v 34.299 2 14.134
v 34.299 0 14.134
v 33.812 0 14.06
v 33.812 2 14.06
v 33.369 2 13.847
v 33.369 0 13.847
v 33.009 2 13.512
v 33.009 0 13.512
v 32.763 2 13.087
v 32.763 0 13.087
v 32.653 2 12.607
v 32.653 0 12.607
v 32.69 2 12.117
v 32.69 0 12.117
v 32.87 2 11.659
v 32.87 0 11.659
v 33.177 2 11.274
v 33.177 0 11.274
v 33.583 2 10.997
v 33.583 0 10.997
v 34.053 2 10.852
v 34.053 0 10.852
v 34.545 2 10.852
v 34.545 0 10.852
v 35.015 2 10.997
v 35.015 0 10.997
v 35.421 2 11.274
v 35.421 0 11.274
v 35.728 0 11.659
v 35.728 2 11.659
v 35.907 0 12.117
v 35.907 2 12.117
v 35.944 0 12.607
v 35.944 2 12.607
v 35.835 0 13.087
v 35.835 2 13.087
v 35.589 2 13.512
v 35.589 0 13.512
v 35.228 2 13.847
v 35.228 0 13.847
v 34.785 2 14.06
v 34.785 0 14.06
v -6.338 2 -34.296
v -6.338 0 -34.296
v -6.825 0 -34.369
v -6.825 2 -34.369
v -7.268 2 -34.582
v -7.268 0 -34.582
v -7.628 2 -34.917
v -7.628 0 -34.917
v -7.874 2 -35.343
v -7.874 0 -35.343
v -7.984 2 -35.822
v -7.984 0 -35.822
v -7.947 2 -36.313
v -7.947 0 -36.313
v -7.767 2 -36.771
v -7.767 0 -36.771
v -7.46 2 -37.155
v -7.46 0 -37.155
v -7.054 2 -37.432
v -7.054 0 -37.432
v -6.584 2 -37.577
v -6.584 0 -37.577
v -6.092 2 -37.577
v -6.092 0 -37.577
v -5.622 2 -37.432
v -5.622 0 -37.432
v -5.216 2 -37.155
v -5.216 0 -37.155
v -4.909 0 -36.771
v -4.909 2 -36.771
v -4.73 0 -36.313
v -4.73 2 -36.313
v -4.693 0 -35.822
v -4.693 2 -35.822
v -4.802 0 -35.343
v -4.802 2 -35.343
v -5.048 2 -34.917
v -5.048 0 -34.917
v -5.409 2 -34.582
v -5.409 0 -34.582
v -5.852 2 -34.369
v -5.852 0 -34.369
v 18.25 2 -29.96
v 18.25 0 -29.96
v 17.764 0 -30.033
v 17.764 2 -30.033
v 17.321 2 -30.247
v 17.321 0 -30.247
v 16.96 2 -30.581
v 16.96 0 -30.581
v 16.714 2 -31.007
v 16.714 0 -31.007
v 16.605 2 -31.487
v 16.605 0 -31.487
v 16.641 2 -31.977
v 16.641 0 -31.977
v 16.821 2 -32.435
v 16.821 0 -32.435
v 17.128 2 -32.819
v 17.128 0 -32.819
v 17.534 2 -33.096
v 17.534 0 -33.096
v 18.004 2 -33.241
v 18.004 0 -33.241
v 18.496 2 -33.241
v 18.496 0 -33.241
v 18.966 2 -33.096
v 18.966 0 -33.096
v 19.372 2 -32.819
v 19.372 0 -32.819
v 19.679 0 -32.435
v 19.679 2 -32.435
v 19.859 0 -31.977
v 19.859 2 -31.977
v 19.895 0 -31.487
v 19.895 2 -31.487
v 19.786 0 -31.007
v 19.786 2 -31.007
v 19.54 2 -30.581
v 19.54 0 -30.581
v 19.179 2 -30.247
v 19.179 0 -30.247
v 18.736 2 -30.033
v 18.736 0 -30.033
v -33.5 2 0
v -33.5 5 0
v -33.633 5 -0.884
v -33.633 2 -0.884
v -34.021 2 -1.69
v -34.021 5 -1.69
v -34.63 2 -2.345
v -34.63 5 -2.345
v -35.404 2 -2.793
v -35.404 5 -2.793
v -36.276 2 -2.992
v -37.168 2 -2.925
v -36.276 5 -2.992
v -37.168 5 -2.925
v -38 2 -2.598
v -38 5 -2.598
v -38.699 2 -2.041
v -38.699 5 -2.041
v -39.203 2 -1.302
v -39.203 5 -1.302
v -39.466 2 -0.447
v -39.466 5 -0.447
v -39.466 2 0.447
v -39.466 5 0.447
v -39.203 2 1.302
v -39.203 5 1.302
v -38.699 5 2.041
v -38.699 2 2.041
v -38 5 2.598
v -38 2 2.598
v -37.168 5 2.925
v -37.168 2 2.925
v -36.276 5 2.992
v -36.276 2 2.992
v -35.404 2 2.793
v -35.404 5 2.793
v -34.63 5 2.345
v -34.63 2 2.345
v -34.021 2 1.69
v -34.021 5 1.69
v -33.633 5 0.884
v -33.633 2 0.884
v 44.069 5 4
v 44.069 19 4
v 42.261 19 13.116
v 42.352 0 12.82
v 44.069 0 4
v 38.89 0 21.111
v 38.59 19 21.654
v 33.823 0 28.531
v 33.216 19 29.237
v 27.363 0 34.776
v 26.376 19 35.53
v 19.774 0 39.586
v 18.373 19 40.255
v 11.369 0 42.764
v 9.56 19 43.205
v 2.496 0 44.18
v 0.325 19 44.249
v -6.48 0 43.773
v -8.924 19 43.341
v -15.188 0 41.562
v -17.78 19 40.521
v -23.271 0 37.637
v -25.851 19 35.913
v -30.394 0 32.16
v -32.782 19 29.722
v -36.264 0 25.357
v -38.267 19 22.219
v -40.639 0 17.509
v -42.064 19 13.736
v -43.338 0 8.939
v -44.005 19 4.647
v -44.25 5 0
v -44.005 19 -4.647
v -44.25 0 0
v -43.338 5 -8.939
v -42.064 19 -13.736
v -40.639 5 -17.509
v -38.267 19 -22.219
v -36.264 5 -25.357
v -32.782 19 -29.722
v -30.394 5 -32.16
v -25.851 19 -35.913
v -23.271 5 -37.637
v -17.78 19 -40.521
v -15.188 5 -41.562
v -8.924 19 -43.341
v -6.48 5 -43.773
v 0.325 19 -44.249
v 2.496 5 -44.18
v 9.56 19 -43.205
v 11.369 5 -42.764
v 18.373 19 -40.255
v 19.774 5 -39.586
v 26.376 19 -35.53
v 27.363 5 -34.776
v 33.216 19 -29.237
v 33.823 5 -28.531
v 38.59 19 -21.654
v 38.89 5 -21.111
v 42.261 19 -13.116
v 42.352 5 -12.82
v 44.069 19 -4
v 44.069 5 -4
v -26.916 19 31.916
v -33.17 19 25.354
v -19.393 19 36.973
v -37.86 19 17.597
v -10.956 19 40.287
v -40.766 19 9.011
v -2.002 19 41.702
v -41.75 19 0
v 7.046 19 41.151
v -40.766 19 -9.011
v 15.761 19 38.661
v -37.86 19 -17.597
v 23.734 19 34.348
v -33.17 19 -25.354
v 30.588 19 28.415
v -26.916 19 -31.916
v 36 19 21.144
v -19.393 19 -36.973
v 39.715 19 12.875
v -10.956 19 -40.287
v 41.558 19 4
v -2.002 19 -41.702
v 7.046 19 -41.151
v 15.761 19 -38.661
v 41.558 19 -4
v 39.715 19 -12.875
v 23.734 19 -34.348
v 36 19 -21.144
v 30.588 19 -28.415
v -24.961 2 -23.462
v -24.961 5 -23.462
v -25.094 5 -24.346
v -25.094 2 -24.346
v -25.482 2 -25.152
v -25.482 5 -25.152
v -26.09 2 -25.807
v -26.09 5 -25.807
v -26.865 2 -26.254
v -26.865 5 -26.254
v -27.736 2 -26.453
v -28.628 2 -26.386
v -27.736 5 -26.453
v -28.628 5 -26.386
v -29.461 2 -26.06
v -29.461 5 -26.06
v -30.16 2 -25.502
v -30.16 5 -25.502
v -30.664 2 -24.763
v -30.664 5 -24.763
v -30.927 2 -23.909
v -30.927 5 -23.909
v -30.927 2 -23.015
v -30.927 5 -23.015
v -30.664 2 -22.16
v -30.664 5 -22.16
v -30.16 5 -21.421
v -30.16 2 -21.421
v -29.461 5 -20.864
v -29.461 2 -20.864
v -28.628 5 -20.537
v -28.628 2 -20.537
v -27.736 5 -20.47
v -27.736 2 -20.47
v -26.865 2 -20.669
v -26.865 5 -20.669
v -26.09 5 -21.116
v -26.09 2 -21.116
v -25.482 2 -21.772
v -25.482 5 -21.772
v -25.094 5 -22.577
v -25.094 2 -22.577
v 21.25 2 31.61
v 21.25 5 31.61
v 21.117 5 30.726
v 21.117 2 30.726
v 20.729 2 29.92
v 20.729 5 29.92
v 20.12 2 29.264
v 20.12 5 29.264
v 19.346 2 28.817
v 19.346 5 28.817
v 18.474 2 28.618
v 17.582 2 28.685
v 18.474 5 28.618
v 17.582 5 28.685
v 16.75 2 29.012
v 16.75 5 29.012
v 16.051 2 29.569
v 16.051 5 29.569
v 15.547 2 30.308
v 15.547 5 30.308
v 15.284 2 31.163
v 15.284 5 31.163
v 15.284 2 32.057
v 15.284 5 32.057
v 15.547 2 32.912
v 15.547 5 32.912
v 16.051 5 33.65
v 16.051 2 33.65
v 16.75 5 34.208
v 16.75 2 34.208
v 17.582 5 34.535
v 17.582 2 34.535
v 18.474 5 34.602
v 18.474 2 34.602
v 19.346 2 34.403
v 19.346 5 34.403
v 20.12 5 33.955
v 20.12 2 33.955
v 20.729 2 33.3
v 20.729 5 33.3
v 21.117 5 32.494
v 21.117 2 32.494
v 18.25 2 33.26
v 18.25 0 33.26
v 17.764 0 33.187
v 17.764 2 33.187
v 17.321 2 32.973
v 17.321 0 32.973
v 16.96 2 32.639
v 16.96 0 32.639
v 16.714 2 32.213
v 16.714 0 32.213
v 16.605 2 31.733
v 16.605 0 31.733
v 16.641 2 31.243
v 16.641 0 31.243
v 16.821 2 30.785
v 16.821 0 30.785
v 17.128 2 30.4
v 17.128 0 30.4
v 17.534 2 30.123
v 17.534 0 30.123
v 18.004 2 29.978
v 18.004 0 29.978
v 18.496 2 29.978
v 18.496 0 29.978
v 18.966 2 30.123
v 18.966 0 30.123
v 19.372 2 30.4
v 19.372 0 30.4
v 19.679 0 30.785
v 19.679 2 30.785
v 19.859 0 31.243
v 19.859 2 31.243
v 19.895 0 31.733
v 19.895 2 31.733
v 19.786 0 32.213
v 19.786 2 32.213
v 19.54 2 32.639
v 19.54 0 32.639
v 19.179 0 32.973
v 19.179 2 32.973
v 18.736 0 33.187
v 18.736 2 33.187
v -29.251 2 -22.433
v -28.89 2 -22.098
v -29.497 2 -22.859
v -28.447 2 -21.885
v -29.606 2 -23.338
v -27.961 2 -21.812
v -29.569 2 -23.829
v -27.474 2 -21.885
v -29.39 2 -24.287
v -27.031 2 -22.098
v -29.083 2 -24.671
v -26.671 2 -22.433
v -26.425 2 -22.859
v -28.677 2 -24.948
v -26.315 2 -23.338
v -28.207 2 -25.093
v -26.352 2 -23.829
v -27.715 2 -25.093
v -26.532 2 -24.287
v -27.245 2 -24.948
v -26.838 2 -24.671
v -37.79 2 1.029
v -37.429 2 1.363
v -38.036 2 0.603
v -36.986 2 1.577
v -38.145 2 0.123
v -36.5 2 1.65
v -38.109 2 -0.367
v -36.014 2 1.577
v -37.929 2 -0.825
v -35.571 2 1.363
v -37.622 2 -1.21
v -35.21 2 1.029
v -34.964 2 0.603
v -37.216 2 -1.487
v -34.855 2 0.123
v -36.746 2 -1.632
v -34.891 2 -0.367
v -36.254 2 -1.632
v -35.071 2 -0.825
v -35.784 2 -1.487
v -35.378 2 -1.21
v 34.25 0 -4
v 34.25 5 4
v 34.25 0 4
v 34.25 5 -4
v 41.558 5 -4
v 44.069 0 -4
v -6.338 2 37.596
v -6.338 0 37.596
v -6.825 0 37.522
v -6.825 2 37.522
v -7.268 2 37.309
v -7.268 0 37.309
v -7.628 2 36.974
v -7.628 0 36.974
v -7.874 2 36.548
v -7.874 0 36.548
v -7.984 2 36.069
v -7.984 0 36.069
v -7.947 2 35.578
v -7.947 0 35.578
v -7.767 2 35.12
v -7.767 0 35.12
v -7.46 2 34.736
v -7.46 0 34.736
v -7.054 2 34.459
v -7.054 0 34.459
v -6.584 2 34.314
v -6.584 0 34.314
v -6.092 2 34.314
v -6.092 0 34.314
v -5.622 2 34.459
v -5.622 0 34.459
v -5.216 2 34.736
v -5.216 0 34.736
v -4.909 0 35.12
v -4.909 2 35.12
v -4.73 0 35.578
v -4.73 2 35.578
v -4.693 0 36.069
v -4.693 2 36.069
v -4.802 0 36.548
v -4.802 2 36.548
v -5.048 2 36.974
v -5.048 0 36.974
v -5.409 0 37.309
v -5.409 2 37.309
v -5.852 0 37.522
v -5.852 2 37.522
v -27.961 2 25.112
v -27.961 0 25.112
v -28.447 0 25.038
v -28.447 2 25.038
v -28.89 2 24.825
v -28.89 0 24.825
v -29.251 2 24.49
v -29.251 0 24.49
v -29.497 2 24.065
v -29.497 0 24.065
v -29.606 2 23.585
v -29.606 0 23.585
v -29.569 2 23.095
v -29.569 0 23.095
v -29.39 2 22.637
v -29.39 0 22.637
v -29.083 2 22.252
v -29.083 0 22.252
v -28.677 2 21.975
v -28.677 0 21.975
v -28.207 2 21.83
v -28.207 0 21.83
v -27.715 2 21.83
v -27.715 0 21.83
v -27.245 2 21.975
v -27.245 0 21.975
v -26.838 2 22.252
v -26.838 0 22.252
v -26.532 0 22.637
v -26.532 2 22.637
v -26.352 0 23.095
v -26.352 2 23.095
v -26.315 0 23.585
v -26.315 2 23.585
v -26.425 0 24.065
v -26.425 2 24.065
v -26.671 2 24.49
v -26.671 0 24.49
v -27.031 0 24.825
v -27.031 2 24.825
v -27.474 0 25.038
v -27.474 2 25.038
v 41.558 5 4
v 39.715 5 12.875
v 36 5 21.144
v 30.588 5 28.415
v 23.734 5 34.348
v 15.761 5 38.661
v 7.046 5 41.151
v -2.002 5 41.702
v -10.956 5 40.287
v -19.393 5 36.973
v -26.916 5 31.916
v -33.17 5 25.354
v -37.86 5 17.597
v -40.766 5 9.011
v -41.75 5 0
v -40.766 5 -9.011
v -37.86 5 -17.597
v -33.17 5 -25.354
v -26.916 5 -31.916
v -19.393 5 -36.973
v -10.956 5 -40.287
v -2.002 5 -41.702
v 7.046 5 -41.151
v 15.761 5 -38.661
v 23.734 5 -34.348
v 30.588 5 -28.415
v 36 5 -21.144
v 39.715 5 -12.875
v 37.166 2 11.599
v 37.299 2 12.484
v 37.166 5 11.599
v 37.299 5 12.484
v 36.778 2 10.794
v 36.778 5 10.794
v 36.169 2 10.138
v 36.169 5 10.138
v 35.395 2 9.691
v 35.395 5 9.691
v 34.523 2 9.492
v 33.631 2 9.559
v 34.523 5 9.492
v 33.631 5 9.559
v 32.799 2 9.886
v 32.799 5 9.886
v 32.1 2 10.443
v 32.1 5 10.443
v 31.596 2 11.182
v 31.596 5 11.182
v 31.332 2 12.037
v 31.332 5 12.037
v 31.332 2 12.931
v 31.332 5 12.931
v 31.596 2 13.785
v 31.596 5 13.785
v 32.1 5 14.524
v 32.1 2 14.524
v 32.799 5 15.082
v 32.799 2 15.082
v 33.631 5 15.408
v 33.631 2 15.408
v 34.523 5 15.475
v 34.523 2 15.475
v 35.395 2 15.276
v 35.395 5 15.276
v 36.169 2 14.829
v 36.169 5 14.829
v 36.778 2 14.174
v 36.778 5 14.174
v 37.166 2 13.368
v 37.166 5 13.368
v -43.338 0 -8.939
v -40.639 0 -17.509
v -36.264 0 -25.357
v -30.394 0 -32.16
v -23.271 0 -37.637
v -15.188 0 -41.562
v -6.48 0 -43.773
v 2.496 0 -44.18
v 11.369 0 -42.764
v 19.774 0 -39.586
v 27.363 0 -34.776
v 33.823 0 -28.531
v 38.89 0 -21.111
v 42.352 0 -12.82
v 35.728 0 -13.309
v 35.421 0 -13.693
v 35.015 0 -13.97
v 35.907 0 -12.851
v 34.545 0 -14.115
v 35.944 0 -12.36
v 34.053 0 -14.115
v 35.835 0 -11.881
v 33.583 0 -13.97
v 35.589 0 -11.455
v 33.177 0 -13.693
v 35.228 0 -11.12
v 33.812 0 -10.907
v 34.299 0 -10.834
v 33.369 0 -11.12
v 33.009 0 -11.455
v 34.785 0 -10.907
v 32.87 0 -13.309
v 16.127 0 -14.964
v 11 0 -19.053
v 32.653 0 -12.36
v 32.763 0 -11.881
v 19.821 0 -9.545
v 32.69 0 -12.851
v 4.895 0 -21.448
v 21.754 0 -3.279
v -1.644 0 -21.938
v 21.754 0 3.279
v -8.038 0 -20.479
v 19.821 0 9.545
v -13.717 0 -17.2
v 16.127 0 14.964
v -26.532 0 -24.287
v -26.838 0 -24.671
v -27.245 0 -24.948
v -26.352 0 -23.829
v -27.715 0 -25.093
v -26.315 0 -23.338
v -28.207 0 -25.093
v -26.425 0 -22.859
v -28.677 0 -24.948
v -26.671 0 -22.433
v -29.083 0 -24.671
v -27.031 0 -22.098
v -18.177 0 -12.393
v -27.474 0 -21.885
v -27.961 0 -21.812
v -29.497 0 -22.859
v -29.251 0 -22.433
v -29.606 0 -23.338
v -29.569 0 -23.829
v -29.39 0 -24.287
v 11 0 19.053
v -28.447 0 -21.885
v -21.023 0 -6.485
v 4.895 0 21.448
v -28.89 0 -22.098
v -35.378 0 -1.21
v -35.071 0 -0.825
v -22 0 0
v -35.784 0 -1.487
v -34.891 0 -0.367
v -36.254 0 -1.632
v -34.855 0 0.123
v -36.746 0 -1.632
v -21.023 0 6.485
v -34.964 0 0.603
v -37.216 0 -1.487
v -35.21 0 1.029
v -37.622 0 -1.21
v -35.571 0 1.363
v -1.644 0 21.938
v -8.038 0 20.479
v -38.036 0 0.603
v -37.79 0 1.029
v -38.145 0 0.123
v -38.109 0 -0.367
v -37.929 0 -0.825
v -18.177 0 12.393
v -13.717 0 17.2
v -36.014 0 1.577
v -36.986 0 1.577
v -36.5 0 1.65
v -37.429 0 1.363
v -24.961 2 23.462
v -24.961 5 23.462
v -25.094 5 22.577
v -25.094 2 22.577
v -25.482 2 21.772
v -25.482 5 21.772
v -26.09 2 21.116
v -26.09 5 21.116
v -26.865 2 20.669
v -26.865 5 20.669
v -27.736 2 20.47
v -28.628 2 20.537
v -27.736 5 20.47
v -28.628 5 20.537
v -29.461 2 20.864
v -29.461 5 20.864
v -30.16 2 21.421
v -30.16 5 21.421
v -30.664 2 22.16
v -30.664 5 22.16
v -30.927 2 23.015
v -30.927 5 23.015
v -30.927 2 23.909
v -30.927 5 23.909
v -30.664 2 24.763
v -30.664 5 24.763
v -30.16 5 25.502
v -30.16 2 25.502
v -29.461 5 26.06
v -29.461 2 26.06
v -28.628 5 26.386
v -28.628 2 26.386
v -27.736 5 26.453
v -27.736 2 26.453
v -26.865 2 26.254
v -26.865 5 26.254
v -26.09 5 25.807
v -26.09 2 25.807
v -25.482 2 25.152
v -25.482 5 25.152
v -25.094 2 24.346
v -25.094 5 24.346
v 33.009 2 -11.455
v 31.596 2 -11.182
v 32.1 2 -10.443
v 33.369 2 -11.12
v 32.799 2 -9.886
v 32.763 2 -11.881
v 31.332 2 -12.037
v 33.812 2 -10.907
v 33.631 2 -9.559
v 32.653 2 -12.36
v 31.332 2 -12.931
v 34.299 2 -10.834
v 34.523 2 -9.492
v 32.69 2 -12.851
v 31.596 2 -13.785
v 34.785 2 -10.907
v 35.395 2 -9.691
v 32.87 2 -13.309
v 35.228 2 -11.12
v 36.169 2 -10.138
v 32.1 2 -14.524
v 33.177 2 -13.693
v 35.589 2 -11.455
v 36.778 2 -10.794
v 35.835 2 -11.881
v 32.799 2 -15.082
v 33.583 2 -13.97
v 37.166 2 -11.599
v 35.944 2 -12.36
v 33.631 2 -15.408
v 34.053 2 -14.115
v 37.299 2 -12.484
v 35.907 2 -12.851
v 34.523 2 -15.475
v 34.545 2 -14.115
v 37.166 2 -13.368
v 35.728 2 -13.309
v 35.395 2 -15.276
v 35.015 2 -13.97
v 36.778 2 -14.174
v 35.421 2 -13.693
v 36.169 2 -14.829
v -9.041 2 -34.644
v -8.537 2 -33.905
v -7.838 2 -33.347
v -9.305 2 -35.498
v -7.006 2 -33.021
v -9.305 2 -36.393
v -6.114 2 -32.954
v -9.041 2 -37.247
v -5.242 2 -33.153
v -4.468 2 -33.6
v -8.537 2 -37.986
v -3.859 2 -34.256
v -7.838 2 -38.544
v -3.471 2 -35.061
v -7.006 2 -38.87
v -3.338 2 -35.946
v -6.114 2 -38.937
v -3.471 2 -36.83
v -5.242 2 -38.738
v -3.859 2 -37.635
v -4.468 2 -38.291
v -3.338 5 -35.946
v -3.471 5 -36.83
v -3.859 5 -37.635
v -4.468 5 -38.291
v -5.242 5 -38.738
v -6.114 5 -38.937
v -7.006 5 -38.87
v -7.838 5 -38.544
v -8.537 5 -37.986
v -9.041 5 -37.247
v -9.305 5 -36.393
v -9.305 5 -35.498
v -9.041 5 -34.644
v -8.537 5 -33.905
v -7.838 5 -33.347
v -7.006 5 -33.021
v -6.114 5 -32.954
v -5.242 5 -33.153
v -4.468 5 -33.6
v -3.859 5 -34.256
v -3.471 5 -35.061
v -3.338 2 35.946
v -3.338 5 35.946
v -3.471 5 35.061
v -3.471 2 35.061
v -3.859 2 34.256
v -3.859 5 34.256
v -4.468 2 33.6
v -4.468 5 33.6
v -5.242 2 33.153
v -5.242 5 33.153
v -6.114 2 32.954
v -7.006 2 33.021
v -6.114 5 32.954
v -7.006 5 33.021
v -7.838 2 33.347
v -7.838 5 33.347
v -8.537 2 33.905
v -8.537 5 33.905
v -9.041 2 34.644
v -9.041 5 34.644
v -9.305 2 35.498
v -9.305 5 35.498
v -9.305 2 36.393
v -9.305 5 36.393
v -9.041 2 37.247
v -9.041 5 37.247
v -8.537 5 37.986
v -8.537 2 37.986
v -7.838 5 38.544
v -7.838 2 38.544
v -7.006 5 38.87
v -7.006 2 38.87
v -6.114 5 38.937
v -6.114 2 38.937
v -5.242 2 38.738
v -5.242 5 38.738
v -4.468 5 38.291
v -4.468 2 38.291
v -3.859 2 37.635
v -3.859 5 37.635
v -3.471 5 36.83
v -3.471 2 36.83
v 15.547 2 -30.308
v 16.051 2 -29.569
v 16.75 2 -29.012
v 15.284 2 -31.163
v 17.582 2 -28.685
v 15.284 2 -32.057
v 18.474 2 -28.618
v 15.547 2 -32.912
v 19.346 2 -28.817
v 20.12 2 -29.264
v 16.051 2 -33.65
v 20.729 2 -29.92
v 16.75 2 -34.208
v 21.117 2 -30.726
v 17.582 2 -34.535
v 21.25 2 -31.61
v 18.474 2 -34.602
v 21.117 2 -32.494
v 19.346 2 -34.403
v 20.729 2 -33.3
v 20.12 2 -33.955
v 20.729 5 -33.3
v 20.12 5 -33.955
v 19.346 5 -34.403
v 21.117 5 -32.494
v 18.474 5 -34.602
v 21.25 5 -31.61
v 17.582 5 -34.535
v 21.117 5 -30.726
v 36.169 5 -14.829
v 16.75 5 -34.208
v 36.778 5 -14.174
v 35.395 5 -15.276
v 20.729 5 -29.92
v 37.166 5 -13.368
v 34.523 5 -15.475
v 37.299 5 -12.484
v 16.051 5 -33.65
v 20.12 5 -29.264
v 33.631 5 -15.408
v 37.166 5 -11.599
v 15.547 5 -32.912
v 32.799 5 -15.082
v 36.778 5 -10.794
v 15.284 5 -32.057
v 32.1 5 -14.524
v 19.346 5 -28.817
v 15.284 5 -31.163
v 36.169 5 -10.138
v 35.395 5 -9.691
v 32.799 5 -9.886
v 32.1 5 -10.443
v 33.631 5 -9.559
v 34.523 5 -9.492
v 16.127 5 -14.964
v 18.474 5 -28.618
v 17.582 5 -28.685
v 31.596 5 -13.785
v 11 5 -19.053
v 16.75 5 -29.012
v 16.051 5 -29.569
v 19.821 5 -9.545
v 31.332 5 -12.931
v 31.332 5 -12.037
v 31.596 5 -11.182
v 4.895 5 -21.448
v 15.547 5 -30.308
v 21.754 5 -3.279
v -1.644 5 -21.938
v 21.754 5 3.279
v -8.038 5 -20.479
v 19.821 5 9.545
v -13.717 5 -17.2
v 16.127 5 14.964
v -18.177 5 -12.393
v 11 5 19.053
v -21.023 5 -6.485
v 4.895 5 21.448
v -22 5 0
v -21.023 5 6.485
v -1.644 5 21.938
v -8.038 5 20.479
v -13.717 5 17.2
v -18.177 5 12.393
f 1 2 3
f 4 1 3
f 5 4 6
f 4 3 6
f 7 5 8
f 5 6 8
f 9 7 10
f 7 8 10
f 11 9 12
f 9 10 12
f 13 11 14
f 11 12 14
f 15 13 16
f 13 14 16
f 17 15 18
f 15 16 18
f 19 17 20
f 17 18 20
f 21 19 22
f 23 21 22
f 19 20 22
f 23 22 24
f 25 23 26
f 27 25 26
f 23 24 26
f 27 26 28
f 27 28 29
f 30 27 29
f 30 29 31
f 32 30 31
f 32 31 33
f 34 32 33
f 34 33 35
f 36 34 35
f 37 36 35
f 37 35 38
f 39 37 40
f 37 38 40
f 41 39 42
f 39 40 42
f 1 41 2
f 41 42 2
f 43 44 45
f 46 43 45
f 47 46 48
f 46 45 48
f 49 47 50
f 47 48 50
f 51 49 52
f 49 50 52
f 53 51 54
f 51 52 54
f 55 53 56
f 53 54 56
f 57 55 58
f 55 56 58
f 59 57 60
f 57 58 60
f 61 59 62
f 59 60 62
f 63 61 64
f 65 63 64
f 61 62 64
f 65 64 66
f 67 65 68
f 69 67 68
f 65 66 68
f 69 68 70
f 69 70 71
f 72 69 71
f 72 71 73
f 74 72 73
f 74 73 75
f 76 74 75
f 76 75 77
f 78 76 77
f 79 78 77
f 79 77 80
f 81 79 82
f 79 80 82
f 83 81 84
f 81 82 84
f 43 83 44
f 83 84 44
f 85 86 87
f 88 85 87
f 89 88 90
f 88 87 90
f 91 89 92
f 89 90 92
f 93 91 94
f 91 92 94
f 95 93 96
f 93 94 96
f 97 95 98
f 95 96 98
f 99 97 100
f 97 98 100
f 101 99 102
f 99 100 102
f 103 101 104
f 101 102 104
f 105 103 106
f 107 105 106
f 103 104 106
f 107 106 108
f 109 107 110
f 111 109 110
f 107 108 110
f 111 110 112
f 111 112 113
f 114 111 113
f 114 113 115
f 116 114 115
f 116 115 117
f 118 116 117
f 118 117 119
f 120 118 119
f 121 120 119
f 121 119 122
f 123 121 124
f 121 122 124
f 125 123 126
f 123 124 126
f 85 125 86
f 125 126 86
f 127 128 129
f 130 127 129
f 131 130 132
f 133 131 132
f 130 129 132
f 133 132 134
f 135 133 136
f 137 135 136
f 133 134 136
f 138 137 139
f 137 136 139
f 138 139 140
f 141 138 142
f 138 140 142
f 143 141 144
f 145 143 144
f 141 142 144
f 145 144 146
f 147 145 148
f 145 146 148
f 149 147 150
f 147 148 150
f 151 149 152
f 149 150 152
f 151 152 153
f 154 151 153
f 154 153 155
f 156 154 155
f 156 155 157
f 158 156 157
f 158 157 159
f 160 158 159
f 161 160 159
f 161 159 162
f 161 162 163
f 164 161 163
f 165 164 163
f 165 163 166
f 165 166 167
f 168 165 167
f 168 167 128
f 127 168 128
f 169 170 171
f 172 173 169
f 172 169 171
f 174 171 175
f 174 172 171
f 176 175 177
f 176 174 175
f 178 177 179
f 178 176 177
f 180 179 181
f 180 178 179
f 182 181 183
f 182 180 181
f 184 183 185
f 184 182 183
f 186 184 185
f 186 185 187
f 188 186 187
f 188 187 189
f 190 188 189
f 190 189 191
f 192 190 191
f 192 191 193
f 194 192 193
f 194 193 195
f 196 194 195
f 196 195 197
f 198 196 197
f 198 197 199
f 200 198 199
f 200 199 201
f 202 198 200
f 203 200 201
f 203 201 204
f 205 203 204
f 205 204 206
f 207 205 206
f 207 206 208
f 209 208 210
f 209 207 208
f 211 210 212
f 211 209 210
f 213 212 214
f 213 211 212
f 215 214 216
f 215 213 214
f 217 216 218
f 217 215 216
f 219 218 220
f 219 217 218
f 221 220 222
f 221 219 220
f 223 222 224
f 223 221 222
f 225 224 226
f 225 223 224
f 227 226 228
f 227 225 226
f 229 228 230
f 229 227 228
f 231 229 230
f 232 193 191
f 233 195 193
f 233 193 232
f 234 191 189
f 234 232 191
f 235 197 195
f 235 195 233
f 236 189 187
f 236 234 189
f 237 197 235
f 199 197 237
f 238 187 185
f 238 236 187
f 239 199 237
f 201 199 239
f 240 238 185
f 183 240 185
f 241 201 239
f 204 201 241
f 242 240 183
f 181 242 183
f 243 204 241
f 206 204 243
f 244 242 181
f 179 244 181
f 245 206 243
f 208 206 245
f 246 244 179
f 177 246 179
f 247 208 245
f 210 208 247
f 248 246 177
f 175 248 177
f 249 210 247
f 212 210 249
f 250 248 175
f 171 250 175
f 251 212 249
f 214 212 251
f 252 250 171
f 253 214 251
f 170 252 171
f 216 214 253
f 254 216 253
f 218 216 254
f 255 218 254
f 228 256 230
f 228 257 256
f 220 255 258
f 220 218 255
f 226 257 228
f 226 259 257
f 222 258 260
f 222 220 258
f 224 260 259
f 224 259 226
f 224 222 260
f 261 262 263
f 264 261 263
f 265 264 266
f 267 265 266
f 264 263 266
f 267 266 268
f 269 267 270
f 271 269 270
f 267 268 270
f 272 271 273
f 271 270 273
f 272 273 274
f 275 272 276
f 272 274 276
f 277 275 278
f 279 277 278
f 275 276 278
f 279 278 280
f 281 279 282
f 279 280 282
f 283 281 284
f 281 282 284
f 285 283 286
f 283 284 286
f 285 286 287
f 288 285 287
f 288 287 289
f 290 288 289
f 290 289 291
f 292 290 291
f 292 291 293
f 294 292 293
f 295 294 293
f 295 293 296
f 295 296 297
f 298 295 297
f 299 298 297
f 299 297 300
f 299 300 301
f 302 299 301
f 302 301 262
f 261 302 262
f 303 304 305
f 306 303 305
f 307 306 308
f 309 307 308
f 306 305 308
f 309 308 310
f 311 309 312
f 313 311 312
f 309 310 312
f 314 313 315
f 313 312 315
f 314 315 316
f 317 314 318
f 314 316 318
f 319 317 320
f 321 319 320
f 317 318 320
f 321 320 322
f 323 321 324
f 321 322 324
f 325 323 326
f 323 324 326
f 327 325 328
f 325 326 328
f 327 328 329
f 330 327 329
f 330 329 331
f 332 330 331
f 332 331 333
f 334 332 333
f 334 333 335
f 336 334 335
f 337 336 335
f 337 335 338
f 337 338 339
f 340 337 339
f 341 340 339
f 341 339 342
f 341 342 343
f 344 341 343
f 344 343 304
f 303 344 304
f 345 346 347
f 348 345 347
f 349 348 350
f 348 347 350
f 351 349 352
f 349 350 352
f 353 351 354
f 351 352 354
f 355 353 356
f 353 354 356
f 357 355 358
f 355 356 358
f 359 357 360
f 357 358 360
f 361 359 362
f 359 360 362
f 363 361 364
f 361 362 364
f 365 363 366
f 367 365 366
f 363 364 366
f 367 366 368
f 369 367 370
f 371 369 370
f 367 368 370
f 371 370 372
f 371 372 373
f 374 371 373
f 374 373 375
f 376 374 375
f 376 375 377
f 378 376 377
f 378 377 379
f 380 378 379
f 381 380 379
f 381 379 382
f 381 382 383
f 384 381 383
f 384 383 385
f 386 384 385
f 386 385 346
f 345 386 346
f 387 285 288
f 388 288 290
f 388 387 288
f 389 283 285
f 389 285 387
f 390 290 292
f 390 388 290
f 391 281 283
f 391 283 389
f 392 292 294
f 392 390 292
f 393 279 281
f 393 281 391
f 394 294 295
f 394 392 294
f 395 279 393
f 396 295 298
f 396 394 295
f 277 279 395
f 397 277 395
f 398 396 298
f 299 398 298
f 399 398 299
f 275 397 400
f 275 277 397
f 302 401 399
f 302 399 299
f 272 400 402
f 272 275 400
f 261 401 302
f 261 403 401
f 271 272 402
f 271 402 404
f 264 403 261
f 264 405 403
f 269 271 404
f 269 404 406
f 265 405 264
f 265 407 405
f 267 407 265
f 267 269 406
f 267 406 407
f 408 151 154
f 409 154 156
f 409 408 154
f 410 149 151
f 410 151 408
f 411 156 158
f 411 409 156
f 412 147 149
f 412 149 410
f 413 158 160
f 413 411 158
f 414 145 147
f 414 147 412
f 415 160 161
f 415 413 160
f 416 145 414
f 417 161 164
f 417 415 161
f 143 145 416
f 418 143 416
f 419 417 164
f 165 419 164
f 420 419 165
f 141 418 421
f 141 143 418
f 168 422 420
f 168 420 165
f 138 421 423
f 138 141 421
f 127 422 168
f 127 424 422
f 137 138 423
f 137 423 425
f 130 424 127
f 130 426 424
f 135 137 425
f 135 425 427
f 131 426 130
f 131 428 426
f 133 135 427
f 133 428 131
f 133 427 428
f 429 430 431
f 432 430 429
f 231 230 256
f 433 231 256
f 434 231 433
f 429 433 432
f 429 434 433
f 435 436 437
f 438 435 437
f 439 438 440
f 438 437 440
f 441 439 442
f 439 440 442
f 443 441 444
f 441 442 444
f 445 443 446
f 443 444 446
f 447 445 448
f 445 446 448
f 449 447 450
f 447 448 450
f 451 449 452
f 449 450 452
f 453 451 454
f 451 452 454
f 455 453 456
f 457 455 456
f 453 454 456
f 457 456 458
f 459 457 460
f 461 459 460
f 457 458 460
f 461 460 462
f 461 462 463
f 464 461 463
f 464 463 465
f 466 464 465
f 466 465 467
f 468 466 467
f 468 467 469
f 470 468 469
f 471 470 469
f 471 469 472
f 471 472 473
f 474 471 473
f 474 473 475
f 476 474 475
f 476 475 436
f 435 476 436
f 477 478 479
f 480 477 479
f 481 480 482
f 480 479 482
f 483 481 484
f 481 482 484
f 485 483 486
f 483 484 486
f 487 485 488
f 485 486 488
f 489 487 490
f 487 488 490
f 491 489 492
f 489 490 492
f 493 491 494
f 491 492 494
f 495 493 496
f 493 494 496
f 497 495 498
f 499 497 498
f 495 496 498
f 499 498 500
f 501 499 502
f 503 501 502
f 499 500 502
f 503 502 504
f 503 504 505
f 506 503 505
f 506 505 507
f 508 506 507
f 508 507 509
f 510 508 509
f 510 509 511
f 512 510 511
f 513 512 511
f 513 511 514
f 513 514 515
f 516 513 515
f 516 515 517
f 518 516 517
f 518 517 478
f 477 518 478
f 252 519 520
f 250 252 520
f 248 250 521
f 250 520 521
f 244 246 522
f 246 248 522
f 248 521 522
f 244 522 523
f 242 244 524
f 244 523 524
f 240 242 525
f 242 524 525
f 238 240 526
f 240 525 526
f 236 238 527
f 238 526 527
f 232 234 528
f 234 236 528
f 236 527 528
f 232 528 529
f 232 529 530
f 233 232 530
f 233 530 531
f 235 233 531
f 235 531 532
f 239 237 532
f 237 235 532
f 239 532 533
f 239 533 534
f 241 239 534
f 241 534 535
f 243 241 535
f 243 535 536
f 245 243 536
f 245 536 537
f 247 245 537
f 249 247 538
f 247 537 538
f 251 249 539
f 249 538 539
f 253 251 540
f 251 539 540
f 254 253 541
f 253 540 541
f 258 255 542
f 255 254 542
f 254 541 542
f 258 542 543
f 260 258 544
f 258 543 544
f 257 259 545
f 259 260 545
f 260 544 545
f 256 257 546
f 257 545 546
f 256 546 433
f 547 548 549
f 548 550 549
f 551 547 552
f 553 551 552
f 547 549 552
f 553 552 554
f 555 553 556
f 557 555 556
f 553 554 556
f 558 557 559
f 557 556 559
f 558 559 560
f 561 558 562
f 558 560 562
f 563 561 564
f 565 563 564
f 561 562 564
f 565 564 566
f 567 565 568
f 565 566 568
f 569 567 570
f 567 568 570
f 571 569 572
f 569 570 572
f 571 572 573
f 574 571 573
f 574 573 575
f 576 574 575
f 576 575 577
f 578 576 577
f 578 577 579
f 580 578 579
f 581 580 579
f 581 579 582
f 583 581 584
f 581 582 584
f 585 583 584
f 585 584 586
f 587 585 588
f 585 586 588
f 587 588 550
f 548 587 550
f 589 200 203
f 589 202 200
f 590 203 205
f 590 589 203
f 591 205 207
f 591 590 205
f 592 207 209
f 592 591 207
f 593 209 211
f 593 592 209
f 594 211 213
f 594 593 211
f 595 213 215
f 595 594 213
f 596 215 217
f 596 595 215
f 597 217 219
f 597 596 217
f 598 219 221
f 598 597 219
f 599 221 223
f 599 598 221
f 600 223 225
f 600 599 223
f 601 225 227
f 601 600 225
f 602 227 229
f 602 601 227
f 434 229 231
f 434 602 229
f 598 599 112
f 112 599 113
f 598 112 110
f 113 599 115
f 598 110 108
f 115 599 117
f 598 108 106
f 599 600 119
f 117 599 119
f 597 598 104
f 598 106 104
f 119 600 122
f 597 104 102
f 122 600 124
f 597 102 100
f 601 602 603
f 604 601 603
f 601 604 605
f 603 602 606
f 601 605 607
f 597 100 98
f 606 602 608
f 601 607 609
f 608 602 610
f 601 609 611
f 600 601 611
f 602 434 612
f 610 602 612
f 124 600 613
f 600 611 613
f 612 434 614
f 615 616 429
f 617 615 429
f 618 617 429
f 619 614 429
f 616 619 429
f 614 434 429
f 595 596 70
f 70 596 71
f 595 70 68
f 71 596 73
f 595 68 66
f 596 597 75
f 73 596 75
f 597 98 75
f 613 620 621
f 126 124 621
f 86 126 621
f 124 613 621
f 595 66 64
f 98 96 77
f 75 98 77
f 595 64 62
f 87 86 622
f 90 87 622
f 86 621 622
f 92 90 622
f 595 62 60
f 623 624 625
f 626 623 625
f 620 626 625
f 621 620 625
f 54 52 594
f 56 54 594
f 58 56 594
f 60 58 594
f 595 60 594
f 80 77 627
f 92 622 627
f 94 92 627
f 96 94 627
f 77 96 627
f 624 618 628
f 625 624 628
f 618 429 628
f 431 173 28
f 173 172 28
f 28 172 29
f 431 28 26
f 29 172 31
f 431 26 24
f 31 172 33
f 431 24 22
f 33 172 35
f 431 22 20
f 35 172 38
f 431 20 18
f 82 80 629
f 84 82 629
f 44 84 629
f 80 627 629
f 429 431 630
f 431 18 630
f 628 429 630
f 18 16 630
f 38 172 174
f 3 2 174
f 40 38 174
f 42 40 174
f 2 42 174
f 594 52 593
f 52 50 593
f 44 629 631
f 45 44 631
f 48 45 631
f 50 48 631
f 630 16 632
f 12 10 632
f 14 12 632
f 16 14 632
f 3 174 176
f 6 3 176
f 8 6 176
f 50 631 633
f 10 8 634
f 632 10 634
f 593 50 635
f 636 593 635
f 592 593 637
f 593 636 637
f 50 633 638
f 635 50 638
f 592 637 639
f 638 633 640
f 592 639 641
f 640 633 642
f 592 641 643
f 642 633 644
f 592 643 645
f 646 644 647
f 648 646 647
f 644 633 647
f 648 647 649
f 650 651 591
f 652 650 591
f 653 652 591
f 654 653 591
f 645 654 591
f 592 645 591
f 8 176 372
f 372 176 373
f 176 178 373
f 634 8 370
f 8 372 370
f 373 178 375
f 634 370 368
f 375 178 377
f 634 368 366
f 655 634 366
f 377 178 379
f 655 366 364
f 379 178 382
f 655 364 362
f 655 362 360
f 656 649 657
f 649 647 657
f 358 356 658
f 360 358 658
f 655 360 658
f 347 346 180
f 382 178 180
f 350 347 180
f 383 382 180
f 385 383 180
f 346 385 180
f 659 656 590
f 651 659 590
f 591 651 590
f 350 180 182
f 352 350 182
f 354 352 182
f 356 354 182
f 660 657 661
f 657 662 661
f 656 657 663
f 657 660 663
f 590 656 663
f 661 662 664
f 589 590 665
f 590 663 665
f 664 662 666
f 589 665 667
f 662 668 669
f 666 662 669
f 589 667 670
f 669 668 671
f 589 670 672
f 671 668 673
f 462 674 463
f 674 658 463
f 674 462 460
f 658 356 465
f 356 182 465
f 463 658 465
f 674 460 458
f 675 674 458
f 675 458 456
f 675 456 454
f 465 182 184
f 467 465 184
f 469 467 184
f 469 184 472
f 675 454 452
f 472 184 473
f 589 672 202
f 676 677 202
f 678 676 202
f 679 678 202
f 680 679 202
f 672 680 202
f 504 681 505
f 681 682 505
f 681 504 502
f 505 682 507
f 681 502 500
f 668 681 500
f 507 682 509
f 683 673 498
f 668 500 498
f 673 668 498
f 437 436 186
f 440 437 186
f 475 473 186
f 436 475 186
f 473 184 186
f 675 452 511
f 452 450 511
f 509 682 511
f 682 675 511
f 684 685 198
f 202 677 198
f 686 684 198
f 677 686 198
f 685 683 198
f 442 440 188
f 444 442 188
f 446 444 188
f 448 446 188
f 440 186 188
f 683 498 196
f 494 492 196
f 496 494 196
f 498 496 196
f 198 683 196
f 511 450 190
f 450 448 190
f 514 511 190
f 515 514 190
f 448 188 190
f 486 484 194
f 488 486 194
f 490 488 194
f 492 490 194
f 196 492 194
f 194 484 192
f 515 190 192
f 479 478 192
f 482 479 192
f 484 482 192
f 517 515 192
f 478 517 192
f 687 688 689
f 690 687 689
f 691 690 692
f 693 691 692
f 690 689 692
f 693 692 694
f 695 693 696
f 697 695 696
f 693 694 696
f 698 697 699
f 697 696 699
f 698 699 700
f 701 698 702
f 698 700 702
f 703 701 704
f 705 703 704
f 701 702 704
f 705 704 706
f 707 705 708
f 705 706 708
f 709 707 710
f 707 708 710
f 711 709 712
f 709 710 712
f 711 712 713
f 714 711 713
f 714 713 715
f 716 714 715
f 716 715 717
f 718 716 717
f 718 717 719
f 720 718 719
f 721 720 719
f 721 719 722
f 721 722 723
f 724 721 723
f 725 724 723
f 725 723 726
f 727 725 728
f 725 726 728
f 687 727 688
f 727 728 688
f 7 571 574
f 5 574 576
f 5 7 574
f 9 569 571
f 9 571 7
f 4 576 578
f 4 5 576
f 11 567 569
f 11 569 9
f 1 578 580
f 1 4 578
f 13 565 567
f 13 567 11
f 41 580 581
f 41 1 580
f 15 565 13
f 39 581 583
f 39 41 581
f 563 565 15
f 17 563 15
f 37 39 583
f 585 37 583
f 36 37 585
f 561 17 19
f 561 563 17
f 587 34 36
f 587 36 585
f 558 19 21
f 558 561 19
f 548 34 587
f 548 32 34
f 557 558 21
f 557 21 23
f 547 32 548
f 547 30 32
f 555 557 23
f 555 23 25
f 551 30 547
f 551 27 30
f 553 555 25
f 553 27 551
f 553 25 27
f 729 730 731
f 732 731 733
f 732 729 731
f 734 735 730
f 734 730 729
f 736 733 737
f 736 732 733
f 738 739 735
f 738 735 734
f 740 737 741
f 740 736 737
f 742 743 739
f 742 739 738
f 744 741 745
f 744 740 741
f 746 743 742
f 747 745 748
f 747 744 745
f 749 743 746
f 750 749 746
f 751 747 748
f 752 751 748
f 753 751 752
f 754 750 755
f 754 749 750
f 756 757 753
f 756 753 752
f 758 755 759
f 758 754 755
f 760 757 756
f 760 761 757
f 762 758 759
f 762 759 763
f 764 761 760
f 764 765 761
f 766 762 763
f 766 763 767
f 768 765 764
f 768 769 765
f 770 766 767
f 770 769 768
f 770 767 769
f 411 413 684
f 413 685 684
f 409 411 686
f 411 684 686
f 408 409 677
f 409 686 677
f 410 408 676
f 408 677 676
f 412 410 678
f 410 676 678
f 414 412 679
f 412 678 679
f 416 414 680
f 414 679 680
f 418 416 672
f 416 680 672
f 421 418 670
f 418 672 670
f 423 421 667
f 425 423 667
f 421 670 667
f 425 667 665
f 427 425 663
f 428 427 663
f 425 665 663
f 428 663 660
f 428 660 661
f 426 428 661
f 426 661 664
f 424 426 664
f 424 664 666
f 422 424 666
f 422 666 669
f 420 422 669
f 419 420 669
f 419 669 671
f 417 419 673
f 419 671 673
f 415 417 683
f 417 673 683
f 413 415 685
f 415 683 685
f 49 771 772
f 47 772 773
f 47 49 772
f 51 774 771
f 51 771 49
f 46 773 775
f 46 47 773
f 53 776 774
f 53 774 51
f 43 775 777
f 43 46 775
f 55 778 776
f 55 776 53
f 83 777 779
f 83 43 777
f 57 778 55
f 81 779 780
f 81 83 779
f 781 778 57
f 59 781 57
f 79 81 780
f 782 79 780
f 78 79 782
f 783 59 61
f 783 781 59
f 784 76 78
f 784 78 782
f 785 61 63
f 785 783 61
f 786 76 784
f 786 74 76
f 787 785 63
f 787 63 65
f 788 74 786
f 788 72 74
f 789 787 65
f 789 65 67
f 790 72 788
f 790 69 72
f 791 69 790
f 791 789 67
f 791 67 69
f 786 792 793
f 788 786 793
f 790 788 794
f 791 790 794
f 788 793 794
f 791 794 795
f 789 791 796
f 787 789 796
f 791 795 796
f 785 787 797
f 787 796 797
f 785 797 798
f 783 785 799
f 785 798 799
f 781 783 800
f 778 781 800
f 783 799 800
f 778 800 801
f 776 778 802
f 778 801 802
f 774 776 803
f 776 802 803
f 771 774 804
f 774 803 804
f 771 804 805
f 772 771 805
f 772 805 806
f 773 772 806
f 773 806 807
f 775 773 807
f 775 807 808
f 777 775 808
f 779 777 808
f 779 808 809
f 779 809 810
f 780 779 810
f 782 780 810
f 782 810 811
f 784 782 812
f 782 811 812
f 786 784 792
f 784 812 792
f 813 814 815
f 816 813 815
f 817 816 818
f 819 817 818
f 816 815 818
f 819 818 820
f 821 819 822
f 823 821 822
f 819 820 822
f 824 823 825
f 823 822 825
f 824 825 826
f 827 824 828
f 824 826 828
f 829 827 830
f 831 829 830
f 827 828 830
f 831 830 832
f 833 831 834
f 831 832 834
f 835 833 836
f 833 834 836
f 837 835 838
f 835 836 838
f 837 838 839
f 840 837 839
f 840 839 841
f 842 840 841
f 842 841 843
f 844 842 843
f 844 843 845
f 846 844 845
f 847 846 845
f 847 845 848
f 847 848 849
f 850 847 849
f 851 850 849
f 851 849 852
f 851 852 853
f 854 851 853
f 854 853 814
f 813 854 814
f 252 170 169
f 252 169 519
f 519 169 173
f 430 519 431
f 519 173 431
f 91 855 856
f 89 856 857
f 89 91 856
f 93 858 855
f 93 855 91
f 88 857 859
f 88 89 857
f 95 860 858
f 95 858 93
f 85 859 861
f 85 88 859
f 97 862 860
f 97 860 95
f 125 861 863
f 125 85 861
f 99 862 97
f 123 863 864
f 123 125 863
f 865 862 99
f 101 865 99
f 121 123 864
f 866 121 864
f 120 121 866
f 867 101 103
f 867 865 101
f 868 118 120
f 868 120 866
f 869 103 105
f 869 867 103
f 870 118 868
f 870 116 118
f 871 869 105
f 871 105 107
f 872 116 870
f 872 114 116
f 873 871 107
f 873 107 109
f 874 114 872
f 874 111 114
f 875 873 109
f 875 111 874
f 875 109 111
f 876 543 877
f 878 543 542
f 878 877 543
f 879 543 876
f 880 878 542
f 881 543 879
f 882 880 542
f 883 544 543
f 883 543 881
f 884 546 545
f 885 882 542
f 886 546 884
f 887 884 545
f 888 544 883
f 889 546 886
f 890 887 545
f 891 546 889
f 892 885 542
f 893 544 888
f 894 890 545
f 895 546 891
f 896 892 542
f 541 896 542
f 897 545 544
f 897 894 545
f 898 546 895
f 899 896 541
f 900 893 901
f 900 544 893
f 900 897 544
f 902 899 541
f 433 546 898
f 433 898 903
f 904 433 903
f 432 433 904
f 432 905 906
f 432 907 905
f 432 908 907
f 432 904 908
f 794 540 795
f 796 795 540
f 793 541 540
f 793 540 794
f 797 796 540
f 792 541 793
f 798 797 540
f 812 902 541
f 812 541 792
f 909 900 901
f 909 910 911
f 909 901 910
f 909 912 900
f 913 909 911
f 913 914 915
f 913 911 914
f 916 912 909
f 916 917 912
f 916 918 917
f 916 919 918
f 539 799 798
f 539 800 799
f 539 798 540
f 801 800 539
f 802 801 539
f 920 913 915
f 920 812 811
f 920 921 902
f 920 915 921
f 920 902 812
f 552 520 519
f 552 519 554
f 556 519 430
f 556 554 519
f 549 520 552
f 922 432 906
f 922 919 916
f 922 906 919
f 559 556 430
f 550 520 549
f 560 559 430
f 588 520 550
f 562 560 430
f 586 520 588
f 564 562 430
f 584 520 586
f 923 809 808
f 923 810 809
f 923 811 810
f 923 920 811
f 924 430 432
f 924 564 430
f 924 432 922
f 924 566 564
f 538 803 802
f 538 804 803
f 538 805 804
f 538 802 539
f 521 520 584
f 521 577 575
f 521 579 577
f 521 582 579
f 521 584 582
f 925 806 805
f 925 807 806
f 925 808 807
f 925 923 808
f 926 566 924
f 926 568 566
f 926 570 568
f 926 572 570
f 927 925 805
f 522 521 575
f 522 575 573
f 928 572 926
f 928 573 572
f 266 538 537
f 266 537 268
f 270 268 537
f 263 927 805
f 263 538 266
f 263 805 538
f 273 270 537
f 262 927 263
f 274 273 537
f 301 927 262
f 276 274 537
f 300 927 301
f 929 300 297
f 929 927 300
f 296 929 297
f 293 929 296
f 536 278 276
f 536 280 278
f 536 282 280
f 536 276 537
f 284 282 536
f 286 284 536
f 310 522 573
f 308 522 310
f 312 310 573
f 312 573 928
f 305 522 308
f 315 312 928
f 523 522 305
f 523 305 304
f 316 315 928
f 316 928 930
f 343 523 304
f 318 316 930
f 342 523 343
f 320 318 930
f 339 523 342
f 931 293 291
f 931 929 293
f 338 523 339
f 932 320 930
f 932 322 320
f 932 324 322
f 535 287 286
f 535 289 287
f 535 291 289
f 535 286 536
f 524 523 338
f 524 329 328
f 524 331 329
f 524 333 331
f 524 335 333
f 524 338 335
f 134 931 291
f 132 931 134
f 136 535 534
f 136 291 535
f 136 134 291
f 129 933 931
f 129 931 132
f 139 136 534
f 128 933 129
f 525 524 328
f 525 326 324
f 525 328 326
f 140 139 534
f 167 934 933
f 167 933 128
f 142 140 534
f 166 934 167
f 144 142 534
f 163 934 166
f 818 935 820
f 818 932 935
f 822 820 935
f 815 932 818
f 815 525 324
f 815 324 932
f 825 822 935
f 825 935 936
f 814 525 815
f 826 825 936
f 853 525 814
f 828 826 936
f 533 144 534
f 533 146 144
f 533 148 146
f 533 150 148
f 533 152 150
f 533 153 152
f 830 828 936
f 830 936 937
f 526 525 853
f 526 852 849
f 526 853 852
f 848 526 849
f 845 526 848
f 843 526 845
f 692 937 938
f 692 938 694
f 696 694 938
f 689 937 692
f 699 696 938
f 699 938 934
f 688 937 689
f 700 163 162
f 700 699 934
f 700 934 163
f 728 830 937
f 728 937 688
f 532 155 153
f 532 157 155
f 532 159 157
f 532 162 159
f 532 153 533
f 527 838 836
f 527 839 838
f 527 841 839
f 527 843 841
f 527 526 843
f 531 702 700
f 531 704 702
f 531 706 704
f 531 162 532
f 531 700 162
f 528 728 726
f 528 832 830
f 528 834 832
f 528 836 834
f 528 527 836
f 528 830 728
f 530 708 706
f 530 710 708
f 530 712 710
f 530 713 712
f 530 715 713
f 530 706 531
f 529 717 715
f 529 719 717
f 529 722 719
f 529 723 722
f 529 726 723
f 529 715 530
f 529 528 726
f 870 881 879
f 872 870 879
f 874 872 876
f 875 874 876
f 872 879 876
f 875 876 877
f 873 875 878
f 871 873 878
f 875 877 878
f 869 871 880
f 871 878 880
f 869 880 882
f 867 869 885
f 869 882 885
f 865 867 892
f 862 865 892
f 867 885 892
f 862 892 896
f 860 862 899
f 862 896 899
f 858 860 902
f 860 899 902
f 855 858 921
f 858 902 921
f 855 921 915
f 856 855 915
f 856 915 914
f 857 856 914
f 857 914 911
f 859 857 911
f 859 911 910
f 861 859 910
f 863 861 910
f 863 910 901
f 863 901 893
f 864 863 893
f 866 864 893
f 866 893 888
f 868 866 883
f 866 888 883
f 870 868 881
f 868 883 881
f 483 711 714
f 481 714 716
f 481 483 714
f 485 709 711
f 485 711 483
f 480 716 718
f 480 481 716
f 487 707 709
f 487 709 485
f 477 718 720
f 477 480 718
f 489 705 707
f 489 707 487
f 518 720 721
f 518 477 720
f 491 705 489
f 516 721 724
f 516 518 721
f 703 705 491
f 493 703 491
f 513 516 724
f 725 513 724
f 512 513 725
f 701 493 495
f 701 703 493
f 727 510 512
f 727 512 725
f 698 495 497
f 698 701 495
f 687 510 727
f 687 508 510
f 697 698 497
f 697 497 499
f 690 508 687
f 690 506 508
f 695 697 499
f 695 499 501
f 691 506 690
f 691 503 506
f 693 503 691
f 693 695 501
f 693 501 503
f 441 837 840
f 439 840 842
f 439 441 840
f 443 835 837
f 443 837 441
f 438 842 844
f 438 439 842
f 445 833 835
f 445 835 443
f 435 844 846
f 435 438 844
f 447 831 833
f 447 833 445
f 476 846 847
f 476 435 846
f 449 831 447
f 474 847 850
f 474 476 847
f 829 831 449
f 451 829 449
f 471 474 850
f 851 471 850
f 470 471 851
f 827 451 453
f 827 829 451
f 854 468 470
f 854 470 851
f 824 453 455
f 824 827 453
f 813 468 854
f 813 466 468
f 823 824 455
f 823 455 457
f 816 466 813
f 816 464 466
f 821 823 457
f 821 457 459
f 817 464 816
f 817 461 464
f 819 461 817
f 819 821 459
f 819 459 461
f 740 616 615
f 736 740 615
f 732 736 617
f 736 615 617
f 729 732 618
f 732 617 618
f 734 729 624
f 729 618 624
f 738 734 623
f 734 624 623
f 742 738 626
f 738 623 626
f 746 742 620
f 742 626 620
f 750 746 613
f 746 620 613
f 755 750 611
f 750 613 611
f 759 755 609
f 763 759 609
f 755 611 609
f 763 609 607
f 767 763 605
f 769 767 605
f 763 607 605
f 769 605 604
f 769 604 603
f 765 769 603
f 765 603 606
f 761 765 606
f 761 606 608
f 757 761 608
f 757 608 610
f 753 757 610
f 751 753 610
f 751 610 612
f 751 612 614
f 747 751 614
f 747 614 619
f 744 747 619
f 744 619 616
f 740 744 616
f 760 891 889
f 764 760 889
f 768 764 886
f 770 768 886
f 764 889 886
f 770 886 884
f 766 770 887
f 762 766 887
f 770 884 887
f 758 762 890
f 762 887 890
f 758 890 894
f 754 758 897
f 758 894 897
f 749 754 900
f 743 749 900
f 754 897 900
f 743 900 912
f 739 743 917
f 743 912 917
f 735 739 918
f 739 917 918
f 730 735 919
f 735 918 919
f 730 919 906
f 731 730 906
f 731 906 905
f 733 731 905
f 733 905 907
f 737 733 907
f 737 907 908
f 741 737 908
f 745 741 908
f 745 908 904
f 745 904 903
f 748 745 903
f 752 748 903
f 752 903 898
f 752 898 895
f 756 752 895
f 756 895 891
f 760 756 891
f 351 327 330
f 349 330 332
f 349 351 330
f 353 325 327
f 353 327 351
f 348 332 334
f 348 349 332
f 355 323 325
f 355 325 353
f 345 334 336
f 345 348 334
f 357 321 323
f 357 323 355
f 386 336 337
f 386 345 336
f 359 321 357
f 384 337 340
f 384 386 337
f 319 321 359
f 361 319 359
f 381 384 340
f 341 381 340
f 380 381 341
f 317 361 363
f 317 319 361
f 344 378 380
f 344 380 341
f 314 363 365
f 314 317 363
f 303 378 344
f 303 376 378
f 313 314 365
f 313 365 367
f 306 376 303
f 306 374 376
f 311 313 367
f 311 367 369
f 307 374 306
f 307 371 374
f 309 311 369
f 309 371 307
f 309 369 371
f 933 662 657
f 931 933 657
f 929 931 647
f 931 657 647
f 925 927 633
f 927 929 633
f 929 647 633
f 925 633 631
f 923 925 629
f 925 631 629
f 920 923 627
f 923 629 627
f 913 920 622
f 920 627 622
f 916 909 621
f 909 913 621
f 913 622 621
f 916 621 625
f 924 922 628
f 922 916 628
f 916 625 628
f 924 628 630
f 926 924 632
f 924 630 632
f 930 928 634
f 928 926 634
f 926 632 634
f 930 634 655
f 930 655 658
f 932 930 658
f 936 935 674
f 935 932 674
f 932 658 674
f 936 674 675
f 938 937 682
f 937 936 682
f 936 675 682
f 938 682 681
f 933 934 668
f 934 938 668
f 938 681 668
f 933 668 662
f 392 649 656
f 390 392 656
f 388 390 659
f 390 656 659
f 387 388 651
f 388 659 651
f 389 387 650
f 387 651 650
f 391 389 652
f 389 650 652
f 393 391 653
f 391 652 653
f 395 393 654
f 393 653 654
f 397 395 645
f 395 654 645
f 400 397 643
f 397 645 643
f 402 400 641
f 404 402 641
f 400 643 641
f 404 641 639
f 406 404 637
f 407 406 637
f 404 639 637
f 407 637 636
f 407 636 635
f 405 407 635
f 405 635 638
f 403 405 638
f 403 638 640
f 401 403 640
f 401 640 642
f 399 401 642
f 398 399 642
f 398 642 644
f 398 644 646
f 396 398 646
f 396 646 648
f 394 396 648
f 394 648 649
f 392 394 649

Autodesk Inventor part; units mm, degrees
ref_plane "YZ Plane" through (0, 0, 0) normal (1, 0, 0) x (0, 1, 0)
ref_plane "XZ Plane" through (0, 0, 0) normal (0, 1, 0) x (-1, 0, 0)
ref_plane "XY Plane" through (0, 0, 0) normal (0, 0, 1) x (1, 0, 0)
sketch "スケッチ1" plane through (0, 0, 0) normal (0, 1, 0) x (-1, 0, 0)
  circle A0 centre (0, 0) radius 44.25
  circle A1 centre (0, 0) radius 22
  dimension "d0" = 88.5
  dimension "d3" = 44
extrude "押し出し1" add sketch "スケッチ1" along normal blind 5
sketch "スケッチ2" plane through (0, 5, 0) normal (0, 1, 0) x (1, 0, 0)
  circle A0 centre (0, 0) radius 36.5
  point P0 (-36.5, 0)
  point P1 (-27.9606, -23.4617)
  point P2 (-6.3382, -35.9455)
  point P3 (18.25, -31.6099)
  point P4 (34.2988, -12.4837)
  point P5 (34.2988, 12.4837)
  point P6 (18.25, 31.6099)
  point P7 (-6.3382, 35.9455)
  point P8 (-27.9606, 23.4617)
  dimension "d4" = 73
  dimension "d7" = 360
hole "穴1" at (-36.5, 5, 0) at (-27.9606, 5, 23.4617) at (-6.3382, 5, 35.9455) at (18.25, 5, 31.6099) at (34.2988, 5, 12.4837) at (34.2988, 5, -12.4837) at (18.25, 5, -31.6099) at (-6.3382, 5, -35.9455) at (-27.9606, 5, -23.4617) direction (0, -1, 0) diameter 3.3 end through all
sketch "スケッチ3" plane through (0, 5, 0) normal (0, 1, 0) x (1, 0, 0)
  circle A0 centre (-36.5, 0) radius 1.65 projected
  circle A1 centre (-36.5, 0) radius 3
  circle A2 centre (-27.9606, -23.4617) radius 3
  circle A3 centre (-6.3382, -35.9455) radius 3
  circle A4 centre (18.25, -31.6099) radius 3
  circle A5 centre (34.2988, -12.4837) radius 3
  circle A6 centre (34.2988, 12.4837) radius 3
  circle A7 centre (18.25, 31.6099) radius 3
  circle A8 centre (-6.3382, 35.9455) radius 3
  circle A9 centre (-27.9606, 23.4617) radius 3
  point P0 (0, 0)
  dimension "d16" = 6
  dimension "d19" = 360
extrude "押し出し2" cut sketch "スケッチ3" against normal blind 3 contours A0 | A1 | A2 | A3 | A4 | A5 | A6 | A7 | A8 | A9
sketch "スケッチ4" plane through (0, 5, 0) normal (0, 1, 0) x (1, 0, 0)
  circle A0 centre (0, 0) radius 41.75
  circle A1 centre (0, 0) radius 44.25 projected
  line L0 (0, 0) -> (44.25, 0)
  line L1 (44.25, 0) -> (44.25, 4)
  line L2 (44.25, 4) -> (0, 4)
  line L3 (0, 4) -> (0, 0)
  line L4 (44.25, 0) -> (44.25, -4)
  line L5 (44.25, -4) -> (0, -4)
  line L6 (0, -4) -> (0, 0)
  point P0 (44.0688, -4)
  point P1 (41.5579, -4)
  point P2 (41.5579, 4)
  point P3 (44.0688, 4)
  dimension "d23" = 2.5
  dimension "d24" = 4
extrude "押し出し3" add sketch "スケッチ4" along normal blind 14 contours A0 L5 A1 L2
sketch "スケッチ6" plane through (0, 5, 0) normal (0, 1, 0) x (1, 0, 0)
  circle A0 centre (0, 0) radius 44.25 projected
  line L0 (44.0688, 4) -> (41.5579, 4) projected
  line L1 (44.25, 0) -> (34.25, 0)
  line L2 (34.25, 0) -> (34.25, 4)
  line L3 (34.25, 4) -> (44.25, 4)
  line L4 (44.25, 4) -> (44.25, 0)
  line L5 (44.0688, -4) -> (29.25, -4)
  line L6 (34.25, 0) -> (34.25, -4)
  line L7 (44.25, -4) -> (44.25, 0)
  point P0 (29.25, 4)
  dimension "d31" = 10
extrude "押し出し5" cut sketch "スケッチ6" against normal blind 14 contours L1 L2 L3 L0 A0 | A0 L5 L6 L1
sketch "スケッチ7" plane through (0, 5, 0) normal (0, 1, 0) x (1, 0, 0)
  circle A0 centre (0, 0) radius 58
  arc A1 (41.5579, 4) -> (41.5579, -4) centre (0, 0) ccw projected
  circle A2 centre (0, 0) radius 22
  circle A3 centre (0, 0) radius 15
  circle A4 centre (40, 0) radius 18
  circle A5 centre (0, 0) radius 22 projected
  circle A6 centre (0, 0) radius 22 projected
  dimension "d36" = 30
  dimension "d37" = 7
  dimension "d39" = 36
  dimension "d41" = 116
properties part number "cablepart1"
